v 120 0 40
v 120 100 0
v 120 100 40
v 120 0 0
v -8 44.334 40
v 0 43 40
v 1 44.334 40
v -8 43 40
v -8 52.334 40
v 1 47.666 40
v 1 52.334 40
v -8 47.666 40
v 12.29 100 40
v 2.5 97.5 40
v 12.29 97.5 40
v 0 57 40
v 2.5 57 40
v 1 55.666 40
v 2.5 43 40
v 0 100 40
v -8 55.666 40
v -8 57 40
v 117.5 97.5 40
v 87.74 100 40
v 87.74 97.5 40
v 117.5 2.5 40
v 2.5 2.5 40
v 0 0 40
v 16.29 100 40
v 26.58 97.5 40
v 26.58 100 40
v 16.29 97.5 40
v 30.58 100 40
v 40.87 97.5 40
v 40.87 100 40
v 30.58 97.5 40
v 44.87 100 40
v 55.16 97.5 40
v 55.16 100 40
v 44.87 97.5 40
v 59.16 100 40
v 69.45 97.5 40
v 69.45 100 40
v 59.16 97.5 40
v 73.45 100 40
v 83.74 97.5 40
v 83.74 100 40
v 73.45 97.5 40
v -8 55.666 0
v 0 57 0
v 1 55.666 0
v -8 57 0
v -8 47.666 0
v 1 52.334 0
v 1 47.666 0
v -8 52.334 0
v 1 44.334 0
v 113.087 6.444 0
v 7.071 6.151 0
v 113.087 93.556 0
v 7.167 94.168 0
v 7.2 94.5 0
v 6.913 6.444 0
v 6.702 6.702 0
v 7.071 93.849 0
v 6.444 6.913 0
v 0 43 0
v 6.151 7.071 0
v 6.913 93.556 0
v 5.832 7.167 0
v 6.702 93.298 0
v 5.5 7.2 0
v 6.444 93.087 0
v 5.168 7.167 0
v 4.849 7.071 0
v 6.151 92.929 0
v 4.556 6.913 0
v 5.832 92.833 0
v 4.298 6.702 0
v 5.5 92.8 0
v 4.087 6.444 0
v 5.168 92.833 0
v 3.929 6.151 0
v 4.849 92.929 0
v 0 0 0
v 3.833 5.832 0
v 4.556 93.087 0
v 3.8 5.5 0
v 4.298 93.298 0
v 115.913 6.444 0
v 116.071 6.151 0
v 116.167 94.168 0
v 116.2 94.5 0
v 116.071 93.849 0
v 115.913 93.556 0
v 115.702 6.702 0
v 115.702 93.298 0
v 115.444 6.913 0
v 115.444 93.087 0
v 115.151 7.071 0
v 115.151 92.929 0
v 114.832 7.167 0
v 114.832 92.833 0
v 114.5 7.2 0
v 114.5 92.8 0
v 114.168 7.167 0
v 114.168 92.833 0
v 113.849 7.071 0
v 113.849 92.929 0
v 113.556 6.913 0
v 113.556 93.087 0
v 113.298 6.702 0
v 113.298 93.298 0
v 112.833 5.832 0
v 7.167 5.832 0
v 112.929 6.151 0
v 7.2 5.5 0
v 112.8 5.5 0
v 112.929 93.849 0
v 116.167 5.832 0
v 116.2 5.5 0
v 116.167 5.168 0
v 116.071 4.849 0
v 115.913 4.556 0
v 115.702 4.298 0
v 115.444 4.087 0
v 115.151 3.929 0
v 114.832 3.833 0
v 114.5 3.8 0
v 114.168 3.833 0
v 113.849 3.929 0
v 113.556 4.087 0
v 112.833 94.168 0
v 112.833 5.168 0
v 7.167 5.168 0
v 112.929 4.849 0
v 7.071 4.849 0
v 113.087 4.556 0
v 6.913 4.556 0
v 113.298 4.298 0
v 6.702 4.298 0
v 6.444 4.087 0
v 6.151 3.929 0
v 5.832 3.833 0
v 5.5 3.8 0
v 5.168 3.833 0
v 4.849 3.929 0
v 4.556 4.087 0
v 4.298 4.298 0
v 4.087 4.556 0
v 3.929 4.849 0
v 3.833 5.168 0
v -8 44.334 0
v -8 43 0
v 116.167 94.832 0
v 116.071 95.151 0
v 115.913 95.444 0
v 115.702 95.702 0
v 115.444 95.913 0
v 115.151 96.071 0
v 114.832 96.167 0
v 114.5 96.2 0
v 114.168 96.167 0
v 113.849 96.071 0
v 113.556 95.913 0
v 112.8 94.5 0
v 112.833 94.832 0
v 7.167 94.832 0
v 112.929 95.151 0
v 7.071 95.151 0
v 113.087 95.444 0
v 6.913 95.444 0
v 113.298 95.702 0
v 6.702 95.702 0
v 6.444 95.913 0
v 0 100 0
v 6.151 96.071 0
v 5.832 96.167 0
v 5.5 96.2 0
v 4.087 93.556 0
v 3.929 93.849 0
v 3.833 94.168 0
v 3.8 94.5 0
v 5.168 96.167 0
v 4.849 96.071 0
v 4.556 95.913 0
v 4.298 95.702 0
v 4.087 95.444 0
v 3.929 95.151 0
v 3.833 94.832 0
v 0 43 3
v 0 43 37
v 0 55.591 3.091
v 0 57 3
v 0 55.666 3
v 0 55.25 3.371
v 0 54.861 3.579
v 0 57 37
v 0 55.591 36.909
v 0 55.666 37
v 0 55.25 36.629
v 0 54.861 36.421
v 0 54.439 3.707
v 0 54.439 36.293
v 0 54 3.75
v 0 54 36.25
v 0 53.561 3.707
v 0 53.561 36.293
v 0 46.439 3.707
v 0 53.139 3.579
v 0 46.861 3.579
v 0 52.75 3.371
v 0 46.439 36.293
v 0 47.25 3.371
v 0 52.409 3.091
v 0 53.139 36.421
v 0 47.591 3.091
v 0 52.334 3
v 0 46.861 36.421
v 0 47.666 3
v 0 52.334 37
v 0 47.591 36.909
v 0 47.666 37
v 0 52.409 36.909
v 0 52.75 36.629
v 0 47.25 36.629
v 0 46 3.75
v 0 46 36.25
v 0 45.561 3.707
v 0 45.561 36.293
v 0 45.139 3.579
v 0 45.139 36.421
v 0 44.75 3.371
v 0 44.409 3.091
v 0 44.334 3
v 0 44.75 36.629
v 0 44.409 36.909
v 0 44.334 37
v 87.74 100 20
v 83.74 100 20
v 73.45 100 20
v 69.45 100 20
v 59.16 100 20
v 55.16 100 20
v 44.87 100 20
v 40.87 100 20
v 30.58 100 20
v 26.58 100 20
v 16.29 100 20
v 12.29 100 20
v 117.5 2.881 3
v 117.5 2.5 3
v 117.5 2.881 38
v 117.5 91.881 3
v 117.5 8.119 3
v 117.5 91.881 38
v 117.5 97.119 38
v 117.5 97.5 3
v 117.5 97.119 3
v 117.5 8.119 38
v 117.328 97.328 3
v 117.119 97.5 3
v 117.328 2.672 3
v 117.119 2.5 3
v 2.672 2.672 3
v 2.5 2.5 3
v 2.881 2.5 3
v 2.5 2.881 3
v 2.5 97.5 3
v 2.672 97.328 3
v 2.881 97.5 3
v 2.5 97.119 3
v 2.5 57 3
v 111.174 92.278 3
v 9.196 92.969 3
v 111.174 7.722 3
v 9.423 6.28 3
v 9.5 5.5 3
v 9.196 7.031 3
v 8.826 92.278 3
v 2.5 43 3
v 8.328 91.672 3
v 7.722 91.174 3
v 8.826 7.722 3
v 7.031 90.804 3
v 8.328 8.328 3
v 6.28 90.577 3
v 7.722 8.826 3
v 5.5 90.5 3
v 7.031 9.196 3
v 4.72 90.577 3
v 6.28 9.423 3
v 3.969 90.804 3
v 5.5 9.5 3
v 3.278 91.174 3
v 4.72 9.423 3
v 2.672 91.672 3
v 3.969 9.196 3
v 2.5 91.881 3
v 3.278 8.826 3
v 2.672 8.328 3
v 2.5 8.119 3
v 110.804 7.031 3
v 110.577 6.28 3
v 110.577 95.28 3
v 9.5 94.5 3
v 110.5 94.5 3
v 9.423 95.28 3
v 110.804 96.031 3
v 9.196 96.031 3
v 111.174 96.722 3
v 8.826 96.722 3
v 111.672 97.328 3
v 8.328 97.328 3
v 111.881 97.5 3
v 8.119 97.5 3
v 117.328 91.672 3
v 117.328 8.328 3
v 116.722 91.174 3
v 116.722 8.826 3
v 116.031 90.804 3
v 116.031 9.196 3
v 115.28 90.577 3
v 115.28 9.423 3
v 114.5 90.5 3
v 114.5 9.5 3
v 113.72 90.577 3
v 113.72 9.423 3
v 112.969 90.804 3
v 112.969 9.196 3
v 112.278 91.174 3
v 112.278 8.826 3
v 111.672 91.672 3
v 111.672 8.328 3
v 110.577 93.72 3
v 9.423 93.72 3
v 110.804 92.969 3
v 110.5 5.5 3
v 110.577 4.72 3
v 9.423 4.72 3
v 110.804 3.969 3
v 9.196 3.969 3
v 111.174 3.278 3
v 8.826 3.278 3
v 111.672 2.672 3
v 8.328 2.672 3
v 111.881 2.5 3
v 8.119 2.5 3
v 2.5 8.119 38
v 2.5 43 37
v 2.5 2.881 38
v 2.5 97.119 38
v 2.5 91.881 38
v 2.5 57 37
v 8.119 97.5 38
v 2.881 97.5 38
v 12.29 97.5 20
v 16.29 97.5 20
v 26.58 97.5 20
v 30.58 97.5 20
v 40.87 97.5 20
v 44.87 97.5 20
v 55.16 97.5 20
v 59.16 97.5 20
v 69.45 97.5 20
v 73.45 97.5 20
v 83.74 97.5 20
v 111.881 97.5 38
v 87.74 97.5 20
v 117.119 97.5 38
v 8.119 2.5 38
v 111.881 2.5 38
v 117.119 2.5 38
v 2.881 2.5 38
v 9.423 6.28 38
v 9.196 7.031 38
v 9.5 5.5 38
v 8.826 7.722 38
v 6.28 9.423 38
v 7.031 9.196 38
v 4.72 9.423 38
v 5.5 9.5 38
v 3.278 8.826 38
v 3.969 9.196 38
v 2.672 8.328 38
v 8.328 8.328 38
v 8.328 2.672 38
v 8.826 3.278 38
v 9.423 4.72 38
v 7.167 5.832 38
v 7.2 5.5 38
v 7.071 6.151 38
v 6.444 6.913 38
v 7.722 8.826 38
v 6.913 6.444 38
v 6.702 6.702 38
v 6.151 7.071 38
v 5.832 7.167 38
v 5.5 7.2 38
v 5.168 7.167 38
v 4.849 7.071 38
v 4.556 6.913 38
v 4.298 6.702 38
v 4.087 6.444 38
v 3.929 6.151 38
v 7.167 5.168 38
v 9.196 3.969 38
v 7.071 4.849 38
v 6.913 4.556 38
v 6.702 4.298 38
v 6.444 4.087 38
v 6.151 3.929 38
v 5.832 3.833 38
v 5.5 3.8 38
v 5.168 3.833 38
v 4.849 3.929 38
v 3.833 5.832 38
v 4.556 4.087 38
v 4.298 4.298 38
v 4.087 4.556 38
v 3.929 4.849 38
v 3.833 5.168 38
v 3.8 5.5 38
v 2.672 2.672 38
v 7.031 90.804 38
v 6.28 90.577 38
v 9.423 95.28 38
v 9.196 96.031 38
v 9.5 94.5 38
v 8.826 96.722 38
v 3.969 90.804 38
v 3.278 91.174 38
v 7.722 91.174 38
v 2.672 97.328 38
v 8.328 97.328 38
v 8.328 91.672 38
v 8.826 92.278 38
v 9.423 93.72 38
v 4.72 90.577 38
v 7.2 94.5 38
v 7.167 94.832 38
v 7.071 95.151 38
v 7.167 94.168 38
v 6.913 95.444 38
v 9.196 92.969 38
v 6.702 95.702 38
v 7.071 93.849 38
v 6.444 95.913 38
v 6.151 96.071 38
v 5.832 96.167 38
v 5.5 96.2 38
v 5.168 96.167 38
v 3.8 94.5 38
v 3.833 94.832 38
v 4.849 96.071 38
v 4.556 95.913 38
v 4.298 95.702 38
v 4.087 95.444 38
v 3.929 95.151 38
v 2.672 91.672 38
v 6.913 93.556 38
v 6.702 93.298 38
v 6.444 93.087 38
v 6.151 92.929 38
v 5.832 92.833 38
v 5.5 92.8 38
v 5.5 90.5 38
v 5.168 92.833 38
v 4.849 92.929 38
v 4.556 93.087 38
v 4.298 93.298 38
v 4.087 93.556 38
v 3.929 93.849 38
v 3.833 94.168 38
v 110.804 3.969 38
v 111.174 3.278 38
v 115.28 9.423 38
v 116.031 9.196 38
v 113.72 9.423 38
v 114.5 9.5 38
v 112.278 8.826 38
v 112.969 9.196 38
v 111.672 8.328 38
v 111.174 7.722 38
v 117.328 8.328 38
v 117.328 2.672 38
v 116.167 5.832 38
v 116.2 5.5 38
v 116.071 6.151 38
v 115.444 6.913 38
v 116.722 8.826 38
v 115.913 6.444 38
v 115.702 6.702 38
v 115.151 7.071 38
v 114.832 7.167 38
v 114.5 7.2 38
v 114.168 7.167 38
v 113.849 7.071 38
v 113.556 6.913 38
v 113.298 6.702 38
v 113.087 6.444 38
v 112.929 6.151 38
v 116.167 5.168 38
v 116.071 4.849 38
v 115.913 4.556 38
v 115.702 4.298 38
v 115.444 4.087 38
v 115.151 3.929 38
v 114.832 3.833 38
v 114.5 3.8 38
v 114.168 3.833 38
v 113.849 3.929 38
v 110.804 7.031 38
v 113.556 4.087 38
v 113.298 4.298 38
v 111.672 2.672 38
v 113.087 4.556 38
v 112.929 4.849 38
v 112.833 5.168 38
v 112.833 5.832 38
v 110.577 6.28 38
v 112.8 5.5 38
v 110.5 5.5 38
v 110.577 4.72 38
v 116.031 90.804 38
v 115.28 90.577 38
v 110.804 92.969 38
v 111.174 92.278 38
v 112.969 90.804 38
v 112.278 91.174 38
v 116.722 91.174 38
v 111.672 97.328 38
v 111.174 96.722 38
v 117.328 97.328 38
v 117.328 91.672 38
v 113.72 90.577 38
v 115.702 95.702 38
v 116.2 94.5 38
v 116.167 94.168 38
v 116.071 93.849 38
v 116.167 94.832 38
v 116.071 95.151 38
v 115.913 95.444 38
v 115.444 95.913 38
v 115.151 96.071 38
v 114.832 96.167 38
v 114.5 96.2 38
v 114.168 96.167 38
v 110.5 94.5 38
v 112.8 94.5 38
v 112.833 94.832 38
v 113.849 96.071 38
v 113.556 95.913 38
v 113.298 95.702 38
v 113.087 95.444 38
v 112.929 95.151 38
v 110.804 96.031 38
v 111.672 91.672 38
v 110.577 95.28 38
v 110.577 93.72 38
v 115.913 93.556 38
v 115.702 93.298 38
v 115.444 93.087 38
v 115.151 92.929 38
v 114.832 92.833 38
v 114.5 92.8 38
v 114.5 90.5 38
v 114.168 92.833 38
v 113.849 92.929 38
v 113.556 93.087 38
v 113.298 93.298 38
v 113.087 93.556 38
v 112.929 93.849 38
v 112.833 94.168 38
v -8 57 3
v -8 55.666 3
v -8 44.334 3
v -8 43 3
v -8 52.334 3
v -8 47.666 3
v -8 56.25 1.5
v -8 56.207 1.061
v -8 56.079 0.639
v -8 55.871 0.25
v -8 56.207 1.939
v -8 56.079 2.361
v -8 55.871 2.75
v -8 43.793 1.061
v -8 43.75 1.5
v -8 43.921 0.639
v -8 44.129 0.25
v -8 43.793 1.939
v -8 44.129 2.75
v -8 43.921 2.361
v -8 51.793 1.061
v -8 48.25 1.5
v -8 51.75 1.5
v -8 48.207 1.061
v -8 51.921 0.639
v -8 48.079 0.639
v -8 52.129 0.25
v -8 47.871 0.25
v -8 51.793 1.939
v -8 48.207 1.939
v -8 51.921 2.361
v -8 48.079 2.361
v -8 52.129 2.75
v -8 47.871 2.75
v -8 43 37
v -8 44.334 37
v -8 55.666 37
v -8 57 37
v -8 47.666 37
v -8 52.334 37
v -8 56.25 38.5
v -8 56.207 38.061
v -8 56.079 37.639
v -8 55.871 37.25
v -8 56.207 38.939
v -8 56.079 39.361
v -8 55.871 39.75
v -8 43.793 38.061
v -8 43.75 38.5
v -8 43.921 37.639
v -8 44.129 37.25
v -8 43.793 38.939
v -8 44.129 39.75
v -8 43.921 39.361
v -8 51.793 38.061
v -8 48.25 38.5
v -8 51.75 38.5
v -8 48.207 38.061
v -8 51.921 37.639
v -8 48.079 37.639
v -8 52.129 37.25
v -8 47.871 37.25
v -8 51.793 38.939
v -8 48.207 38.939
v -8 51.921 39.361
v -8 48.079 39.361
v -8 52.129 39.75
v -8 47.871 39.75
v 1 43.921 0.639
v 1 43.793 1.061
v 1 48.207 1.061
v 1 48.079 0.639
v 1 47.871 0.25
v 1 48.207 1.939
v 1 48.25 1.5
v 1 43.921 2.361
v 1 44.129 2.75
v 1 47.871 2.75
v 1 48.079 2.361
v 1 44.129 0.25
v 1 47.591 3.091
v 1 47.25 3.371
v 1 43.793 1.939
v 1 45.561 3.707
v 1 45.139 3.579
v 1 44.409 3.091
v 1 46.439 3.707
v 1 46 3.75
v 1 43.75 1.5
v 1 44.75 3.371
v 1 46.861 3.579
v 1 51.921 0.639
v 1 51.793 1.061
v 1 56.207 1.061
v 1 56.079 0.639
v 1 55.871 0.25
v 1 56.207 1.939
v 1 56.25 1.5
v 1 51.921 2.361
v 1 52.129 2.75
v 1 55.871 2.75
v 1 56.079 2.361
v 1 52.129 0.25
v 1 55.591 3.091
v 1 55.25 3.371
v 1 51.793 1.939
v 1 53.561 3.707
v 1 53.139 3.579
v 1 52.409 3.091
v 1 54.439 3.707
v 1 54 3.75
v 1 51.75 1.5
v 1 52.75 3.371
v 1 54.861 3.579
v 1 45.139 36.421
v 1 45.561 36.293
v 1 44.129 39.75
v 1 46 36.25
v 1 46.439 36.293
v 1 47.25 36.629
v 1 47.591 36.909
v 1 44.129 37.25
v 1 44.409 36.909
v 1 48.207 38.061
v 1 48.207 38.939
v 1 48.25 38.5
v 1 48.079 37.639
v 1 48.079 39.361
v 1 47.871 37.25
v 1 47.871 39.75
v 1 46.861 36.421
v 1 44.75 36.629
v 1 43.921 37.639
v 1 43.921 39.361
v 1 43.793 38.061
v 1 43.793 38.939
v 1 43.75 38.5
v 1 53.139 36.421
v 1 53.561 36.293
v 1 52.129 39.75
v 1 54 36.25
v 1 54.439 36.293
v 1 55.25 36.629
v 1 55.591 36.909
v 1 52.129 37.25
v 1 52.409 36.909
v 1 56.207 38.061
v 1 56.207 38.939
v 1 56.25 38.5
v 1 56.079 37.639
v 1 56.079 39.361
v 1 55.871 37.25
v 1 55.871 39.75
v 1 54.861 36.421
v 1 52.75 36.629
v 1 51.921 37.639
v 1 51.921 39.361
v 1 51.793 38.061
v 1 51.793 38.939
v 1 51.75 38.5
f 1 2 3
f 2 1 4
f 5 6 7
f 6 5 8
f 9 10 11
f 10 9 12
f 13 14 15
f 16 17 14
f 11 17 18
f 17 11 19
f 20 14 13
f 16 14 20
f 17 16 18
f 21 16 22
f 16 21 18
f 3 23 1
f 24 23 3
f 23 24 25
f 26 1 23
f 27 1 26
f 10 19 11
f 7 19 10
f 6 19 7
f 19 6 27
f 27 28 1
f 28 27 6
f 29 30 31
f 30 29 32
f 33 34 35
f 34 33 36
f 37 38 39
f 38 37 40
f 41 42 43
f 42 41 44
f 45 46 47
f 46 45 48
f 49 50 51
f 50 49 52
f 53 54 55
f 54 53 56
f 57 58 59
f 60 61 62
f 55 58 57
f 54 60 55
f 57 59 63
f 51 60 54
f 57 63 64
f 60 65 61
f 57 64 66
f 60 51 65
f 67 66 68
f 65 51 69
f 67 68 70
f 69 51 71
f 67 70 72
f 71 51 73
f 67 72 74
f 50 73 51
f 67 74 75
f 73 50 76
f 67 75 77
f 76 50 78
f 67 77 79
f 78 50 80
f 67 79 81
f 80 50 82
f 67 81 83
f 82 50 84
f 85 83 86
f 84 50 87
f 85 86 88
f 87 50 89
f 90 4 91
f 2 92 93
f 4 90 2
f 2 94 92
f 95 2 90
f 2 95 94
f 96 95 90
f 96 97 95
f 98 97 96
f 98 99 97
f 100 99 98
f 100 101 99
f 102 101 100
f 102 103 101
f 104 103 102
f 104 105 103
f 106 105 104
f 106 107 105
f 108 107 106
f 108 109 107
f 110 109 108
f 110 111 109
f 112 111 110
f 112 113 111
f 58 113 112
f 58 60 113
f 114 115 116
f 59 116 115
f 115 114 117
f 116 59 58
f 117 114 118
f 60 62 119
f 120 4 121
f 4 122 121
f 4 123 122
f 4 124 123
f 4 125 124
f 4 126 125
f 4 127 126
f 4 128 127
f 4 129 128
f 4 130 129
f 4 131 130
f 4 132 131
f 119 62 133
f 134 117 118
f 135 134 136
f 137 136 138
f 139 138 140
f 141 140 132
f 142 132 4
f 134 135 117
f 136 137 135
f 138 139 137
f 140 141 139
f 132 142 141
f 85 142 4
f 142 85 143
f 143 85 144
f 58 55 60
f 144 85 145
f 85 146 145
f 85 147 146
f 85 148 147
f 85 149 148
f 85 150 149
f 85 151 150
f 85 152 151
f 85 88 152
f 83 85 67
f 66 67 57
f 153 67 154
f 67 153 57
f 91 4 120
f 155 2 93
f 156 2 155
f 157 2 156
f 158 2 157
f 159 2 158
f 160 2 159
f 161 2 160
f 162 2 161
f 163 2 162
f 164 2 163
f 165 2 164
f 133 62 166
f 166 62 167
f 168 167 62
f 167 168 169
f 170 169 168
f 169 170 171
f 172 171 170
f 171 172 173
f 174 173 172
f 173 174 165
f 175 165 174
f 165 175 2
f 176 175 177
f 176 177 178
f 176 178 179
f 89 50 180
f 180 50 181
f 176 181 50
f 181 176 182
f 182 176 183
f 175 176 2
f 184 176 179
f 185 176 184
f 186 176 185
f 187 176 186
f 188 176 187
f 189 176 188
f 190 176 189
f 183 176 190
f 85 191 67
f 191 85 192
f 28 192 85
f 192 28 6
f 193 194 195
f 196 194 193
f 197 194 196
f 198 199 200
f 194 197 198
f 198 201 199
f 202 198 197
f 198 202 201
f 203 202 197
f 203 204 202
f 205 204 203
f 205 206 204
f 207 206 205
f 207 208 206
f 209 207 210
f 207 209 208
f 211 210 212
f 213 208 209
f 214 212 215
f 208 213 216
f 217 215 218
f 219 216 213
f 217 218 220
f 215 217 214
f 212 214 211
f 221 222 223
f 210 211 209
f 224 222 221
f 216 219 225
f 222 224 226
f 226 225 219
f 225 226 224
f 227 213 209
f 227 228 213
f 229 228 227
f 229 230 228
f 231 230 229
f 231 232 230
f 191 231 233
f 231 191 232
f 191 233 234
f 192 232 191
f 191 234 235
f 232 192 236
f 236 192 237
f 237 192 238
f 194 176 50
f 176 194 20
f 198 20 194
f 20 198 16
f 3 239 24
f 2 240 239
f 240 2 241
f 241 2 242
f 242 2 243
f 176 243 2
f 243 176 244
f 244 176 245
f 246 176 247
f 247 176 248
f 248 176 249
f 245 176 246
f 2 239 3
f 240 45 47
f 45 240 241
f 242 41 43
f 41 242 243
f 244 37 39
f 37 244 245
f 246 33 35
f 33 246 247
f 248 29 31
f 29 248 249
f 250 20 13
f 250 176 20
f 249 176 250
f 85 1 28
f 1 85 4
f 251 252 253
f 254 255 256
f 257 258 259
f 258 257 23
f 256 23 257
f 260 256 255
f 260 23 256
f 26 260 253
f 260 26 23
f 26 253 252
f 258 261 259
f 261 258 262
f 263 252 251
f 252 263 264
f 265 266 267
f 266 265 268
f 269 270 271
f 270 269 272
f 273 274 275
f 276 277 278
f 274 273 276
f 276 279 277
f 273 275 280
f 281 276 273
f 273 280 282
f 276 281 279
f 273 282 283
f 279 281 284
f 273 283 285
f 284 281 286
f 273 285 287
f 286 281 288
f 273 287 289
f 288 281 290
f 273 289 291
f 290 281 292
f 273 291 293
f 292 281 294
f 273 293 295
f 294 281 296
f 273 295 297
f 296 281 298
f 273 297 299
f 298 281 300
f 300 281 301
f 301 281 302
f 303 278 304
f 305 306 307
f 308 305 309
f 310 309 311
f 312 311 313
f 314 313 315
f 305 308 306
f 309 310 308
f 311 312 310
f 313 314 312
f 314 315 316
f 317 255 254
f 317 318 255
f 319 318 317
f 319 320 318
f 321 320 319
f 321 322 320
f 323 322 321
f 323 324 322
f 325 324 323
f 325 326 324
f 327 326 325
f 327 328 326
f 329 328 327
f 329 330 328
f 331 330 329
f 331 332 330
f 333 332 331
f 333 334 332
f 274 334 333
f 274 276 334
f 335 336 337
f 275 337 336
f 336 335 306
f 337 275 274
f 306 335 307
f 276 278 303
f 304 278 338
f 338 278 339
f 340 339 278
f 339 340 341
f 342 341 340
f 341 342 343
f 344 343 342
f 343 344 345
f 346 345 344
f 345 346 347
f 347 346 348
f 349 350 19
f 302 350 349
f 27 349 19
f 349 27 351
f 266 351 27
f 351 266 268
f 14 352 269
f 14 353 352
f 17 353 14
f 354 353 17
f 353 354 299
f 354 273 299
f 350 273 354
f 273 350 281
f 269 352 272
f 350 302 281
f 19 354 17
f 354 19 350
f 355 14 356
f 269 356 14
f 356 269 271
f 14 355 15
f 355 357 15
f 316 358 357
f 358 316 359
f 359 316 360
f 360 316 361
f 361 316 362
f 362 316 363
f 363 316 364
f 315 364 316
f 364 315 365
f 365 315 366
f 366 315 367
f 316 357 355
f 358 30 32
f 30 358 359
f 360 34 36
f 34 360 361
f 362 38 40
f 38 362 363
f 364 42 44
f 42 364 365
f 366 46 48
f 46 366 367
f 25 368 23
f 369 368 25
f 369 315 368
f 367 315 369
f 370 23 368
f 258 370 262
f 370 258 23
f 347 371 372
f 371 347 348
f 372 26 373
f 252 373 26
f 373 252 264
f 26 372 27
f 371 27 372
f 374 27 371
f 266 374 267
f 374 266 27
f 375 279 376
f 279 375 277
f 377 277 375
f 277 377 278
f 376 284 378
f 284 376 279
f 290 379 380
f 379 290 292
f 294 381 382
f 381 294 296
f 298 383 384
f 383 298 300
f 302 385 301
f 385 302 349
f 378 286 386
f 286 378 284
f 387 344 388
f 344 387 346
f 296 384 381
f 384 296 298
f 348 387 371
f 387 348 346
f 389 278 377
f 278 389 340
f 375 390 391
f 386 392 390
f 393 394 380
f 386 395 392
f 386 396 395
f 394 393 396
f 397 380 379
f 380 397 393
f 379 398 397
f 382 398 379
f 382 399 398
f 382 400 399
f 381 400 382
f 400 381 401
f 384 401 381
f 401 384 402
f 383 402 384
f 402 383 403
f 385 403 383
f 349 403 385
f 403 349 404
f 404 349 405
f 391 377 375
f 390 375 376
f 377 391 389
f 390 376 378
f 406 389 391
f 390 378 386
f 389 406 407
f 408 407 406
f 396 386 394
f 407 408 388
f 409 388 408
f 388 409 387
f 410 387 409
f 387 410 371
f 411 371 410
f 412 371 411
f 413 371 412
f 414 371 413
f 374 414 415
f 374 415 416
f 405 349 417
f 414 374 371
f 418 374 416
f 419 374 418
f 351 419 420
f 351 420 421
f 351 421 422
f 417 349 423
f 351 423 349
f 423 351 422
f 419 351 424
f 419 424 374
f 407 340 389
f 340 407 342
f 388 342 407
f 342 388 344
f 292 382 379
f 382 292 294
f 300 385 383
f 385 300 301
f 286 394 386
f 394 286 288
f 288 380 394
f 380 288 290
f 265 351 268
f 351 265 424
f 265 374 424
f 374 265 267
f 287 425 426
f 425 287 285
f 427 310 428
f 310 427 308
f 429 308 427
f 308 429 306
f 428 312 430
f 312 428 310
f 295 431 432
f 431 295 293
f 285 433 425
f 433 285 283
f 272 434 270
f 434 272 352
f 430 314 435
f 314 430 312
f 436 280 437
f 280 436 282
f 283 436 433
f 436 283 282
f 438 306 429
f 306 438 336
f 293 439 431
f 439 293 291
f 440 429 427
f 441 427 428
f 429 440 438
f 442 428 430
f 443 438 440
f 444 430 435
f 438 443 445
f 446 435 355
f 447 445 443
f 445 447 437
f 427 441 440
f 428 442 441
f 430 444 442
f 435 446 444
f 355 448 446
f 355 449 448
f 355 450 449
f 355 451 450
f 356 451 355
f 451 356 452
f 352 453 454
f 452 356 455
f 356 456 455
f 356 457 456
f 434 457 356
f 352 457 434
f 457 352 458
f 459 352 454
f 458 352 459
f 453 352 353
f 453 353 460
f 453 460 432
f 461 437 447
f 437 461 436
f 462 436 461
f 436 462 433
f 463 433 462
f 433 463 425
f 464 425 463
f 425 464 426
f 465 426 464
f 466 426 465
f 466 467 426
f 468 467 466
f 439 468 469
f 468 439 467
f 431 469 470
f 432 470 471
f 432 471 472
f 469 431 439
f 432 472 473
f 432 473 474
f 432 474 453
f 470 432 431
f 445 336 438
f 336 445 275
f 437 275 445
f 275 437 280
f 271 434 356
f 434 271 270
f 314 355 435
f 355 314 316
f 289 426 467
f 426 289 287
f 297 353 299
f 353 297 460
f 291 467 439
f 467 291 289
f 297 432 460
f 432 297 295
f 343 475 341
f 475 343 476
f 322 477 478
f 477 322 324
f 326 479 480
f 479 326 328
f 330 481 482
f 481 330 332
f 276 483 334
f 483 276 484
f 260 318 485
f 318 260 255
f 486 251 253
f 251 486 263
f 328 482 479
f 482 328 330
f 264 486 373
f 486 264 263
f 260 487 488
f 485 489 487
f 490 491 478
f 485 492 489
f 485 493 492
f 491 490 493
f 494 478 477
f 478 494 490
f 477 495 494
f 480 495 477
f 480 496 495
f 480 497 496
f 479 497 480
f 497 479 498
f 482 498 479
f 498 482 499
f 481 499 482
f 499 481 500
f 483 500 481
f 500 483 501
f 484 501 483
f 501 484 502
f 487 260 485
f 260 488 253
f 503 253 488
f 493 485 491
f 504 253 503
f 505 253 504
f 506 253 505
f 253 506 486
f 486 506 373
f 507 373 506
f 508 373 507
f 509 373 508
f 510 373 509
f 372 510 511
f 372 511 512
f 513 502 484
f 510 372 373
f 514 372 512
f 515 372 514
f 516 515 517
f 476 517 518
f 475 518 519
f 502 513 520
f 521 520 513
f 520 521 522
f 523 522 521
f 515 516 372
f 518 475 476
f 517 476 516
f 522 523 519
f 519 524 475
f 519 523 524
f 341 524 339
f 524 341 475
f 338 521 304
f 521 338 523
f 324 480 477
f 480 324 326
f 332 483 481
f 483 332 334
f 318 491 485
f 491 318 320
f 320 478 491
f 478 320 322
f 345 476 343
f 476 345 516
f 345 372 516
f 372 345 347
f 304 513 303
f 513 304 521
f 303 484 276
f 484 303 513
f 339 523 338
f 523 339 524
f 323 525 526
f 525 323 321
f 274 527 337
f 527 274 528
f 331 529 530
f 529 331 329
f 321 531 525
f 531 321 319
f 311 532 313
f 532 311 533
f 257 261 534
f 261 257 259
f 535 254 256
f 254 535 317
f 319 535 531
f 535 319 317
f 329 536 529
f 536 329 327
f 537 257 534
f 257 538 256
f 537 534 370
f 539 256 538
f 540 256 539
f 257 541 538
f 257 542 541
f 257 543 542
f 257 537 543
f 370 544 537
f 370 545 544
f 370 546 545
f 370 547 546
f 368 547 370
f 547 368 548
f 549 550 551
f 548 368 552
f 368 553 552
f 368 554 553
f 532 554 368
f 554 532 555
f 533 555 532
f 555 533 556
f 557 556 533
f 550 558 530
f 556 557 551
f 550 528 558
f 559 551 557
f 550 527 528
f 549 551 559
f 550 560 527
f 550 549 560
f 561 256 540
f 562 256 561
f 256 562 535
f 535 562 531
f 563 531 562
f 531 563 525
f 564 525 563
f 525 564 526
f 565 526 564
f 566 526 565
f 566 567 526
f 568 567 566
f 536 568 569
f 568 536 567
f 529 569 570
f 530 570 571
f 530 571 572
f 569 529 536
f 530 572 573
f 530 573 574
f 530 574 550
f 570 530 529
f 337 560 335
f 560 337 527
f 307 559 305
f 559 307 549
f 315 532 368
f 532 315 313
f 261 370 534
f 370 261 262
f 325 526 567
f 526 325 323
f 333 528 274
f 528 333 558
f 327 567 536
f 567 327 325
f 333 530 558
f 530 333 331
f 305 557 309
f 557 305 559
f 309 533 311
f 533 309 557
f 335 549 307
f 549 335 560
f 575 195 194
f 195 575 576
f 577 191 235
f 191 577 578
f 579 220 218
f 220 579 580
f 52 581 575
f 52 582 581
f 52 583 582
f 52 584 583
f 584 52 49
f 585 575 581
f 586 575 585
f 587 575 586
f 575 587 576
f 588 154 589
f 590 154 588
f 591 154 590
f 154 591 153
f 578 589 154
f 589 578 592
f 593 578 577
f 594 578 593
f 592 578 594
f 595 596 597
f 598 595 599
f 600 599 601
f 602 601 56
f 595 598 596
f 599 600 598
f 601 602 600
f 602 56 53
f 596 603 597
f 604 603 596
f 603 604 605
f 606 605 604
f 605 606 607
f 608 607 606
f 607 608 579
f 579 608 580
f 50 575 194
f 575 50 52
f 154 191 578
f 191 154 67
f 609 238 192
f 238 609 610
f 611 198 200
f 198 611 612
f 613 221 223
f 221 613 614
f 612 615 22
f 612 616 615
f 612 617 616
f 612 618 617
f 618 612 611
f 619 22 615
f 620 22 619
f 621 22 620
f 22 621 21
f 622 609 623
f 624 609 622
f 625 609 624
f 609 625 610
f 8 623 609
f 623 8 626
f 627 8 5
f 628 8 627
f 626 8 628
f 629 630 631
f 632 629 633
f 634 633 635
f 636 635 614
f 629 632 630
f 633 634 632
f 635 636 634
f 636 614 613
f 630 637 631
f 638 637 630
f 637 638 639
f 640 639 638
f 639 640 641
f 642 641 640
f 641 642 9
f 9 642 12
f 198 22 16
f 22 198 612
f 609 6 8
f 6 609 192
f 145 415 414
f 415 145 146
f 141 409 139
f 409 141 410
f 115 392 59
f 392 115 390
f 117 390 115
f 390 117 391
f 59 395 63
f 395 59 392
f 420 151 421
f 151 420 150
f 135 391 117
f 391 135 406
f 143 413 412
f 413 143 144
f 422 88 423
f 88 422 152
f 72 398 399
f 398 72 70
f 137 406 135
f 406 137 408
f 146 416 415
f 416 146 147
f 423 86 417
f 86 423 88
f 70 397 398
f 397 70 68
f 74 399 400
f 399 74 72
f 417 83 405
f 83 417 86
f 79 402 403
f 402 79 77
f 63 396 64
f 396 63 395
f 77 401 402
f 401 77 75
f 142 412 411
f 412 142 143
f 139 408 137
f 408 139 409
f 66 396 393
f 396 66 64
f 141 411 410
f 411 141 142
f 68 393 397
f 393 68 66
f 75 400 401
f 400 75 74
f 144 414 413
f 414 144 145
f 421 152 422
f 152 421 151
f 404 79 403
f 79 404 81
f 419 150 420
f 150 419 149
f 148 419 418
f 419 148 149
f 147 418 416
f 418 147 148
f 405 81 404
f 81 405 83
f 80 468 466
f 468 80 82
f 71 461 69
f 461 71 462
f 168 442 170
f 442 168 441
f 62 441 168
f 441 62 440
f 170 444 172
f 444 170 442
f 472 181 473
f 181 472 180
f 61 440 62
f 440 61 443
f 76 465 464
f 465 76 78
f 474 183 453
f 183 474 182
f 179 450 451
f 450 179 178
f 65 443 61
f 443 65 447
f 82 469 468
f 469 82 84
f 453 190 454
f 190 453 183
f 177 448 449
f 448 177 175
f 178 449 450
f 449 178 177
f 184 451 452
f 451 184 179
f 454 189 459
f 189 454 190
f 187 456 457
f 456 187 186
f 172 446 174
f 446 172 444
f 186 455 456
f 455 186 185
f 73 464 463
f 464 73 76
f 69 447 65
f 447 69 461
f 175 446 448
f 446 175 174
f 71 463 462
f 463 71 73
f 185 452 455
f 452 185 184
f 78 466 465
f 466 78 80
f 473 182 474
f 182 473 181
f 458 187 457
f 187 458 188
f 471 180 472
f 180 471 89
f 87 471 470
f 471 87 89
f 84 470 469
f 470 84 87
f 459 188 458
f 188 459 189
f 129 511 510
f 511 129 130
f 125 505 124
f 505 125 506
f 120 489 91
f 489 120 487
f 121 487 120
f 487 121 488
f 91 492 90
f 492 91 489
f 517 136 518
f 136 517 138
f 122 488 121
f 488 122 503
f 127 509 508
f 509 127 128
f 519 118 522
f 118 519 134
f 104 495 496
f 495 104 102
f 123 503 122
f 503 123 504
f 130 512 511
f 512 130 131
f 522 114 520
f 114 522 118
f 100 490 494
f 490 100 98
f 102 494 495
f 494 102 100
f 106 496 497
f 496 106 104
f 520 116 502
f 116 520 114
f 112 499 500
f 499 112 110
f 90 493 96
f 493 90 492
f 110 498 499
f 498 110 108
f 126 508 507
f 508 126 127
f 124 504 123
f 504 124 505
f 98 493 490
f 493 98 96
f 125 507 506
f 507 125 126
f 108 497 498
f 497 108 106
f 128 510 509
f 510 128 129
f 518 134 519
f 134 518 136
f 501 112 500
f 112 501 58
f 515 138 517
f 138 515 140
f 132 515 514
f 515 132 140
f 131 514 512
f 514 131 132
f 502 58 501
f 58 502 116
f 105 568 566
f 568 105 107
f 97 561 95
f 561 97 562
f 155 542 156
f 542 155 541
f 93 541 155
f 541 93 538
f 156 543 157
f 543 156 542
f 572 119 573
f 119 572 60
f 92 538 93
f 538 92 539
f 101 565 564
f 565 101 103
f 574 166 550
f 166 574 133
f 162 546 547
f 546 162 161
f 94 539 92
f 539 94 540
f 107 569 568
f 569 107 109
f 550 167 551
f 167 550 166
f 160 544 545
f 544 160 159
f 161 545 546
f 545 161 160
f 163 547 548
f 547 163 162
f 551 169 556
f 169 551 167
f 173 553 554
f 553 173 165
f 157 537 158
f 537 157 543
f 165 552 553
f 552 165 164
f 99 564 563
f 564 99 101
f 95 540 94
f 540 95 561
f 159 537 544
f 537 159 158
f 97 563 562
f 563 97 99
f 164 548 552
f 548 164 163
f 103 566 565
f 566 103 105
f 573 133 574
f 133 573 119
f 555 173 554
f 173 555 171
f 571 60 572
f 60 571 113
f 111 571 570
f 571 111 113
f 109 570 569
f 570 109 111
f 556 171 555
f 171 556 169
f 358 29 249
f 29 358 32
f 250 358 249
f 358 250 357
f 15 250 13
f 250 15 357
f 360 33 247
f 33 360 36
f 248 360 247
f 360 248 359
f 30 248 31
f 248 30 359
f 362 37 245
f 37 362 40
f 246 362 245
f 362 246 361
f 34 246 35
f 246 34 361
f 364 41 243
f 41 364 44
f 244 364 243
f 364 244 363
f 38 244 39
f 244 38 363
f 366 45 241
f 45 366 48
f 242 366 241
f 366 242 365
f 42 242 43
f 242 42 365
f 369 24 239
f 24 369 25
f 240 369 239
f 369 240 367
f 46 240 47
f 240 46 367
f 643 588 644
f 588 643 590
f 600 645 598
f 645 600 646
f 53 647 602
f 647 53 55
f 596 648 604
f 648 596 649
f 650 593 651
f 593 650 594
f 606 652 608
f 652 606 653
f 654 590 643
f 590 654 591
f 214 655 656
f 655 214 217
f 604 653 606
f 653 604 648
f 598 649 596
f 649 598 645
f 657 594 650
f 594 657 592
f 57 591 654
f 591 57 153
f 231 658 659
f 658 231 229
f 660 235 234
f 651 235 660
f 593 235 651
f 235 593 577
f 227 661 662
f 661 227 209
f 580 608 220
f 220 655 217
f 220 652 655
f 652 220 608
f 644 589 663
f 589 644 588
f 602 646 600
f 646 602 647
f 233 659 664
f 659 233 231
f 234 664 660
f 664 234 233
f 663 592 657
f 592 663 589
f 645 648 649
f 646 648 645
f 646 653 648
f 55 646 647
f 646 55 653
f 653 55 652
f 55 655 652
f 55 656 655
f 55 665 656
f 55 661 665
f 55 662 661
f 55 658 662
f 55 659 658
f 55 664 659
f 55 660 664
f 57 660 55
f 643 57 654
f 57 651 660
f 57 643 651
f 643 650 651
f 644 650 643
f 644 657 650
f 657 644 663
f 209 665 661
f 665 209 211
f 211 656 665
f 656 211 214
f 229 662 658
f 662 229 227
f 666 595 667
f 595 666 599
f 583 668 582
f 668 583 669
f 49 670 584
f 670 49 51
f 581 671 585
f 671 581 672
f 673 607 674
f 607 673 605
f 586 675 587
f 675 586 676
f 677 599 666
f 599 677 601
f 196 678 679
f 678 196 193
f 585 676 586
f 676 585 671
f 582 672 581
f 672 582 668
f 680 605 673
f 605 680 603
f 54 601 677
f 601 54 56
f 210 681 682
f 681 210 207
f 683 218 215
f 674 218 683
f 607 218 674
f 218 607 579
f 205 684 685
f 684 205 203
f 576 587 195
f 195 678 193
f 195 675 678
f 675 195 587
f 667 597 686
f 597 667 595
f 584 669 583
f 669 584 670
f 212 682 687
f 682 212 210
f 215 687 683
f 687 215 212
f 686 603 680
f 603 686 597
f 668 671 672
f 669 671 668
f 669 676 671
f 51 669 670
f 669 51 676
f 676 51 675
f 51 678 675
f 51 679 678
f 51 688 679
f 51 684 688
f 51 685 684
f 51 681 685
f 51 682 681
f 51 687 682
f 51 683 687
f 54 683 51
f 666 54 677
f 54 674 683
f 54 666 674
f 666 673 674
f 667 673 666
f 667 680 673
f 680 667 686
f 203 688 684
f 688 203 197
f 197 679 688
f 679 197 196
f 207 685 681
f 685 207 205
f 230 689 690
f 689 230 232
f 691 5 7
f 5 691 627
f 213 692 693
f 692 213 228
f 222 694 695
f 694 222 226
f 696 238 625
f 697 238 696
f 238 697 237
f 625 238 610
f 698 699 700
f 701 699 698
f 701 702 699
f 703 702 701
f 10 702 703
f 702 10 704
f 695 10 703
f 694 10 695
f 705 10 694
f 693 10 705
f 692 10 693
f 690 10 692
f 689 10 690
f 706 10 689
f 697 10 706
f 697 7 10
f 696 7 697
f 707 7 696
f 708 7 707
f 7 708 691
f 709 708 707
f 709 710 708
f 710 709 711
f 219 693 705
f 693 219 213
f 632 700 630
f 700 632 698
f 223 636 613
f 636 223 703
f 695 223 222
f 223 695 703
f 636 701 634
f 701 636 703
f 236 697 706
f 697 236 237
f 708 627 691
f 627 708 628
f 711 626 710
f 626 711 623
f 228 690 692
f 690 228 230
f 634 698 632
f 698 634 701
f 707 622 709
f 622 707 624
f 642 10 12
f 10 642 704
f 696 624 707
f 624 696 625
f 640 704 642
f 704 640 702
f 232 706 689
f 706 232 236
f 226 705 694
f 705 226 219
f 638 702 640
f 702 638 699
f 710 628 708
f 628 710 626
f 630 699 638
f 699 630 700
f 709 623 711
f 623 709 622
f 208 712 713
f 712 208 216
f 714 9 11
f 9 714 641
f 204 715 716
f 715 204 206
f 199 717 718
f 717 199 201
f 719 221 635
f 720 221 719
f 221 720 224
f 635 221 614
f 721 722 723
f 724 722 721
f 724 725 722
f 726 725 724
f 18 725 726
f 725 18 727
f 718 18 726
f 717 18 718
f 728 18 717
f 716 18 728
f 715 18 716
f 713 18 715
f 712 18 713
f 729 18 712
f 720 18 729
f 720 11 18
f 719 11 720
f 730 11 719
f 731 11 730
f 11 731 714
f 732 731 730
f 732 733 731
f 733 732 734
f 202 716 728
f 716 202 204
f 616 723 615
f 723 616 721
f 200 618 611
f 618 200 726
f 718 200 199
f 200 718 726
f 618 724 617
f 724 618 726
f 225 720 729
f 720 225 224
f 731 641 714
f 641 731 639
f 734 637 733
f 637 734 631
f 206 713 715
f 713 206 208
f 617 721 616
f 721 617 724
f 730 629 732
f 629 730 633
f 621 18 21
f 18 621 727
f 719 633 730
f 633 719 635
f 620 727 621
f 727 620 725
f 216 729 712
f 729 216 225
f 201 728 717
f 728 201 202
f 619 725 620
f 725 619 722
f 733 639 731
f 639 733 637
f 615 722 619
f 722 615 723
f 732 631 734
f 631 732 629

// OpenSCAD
$fn = 32;

// ----------------------------------------------------------------------
// Enclosure body: 120 x 100 x 40 mm, wall 2.5 mm
// ----------------------------------------------------------------------

// --- parameters (mm) ---
length = 120;             // outside length, X
width = 100;              // outside width, Y
height = 40;              // outside height, Z
wall = 2.5;               // side wall thickness
floor_t = 3;              // floor thickness
boss_d = 8;               // corner boss diameter
boss_h = 35;              // corner boss height above the floor
boss_hole_d = 3.4;        // lid screw clearance in the boss
boss_lip = 5.5;           // boss centre inset from the corner
ear_w = 14;               // mounting ear width
ear_t = 3;                // mounting ear thickness
ear_ext = 8;              // mounting ear reach
ear_hole_d = 4.5;         // mounting ear drills
vent_slots = 6;           // vent slots in the long wall
vent_w = 4;               // vent slot width
vent_h = 25;              // vent slot height
vent_pitch = 14.29;       // vent slot pitch
vent_z = 20;              // vent slot sill height

module shell() {
  difference() {
    cube([length, width, height]);
    /* hollow, open at the top */
    translate([wall, wall, floor_t])
      cube([length - 2 * wall, width - 2 * wall, height]);
  }
}

module bosses() {
  /* corner bosses, sunk 1 mm into the floor */
  for (sx = [0, 1]) for (sy = [0, 1])
    translate([sx * (length - 2 * boss_lip) + boss_lip, sy * (width - 2 * boss_lip) + boss_lip, floor_t - 1])
      cylinder(h = boss_h + 1, d = boss_d);
}

module ears() {
  /* mounting ears on the short walls, sunk into the wall */
  for (sz = [0, 1])
    translate([-ear_ext, width / 2 - ear_w / 2, sz * (height - ear_t)])
      cube([ear_ext + 2.5, ear_w, ear_t]);
}

difference() {
  union() {
    shell();
    bosses();
    ears();
  }
  /* boss screw holes */
  for (sx = [0, 1]) for (sy = [0, 1])
    translate([sx * (length - 2 * boss_lip) + boss_lip, sy * (width - 2 * boss_lip) + boss_lip, -1]) cylinder(h = floor_t + boss_h + 2, d = boss_hole_d);
  /* vent grille in the +Y wall */
  for (i = [0 : vent_slots - 1]) translate([vent_pitch * (i + 1) - vent_w / 2, width - wall - 1, vent_z]) cube([vent_w, wall + 2, vent_h]);
  for (sz = [0, 1]) for (sx = [0, 1]) translate([-ear_ext - 1, width / 2 + (2 * sx - 1) * (ear_w / 2 - 3), sz * (height - ear_t) + ear_t / 2]) rotate([0, 90, 0]) cylinder(h = ear_ext + 2, d = ear_hole_d);
}
